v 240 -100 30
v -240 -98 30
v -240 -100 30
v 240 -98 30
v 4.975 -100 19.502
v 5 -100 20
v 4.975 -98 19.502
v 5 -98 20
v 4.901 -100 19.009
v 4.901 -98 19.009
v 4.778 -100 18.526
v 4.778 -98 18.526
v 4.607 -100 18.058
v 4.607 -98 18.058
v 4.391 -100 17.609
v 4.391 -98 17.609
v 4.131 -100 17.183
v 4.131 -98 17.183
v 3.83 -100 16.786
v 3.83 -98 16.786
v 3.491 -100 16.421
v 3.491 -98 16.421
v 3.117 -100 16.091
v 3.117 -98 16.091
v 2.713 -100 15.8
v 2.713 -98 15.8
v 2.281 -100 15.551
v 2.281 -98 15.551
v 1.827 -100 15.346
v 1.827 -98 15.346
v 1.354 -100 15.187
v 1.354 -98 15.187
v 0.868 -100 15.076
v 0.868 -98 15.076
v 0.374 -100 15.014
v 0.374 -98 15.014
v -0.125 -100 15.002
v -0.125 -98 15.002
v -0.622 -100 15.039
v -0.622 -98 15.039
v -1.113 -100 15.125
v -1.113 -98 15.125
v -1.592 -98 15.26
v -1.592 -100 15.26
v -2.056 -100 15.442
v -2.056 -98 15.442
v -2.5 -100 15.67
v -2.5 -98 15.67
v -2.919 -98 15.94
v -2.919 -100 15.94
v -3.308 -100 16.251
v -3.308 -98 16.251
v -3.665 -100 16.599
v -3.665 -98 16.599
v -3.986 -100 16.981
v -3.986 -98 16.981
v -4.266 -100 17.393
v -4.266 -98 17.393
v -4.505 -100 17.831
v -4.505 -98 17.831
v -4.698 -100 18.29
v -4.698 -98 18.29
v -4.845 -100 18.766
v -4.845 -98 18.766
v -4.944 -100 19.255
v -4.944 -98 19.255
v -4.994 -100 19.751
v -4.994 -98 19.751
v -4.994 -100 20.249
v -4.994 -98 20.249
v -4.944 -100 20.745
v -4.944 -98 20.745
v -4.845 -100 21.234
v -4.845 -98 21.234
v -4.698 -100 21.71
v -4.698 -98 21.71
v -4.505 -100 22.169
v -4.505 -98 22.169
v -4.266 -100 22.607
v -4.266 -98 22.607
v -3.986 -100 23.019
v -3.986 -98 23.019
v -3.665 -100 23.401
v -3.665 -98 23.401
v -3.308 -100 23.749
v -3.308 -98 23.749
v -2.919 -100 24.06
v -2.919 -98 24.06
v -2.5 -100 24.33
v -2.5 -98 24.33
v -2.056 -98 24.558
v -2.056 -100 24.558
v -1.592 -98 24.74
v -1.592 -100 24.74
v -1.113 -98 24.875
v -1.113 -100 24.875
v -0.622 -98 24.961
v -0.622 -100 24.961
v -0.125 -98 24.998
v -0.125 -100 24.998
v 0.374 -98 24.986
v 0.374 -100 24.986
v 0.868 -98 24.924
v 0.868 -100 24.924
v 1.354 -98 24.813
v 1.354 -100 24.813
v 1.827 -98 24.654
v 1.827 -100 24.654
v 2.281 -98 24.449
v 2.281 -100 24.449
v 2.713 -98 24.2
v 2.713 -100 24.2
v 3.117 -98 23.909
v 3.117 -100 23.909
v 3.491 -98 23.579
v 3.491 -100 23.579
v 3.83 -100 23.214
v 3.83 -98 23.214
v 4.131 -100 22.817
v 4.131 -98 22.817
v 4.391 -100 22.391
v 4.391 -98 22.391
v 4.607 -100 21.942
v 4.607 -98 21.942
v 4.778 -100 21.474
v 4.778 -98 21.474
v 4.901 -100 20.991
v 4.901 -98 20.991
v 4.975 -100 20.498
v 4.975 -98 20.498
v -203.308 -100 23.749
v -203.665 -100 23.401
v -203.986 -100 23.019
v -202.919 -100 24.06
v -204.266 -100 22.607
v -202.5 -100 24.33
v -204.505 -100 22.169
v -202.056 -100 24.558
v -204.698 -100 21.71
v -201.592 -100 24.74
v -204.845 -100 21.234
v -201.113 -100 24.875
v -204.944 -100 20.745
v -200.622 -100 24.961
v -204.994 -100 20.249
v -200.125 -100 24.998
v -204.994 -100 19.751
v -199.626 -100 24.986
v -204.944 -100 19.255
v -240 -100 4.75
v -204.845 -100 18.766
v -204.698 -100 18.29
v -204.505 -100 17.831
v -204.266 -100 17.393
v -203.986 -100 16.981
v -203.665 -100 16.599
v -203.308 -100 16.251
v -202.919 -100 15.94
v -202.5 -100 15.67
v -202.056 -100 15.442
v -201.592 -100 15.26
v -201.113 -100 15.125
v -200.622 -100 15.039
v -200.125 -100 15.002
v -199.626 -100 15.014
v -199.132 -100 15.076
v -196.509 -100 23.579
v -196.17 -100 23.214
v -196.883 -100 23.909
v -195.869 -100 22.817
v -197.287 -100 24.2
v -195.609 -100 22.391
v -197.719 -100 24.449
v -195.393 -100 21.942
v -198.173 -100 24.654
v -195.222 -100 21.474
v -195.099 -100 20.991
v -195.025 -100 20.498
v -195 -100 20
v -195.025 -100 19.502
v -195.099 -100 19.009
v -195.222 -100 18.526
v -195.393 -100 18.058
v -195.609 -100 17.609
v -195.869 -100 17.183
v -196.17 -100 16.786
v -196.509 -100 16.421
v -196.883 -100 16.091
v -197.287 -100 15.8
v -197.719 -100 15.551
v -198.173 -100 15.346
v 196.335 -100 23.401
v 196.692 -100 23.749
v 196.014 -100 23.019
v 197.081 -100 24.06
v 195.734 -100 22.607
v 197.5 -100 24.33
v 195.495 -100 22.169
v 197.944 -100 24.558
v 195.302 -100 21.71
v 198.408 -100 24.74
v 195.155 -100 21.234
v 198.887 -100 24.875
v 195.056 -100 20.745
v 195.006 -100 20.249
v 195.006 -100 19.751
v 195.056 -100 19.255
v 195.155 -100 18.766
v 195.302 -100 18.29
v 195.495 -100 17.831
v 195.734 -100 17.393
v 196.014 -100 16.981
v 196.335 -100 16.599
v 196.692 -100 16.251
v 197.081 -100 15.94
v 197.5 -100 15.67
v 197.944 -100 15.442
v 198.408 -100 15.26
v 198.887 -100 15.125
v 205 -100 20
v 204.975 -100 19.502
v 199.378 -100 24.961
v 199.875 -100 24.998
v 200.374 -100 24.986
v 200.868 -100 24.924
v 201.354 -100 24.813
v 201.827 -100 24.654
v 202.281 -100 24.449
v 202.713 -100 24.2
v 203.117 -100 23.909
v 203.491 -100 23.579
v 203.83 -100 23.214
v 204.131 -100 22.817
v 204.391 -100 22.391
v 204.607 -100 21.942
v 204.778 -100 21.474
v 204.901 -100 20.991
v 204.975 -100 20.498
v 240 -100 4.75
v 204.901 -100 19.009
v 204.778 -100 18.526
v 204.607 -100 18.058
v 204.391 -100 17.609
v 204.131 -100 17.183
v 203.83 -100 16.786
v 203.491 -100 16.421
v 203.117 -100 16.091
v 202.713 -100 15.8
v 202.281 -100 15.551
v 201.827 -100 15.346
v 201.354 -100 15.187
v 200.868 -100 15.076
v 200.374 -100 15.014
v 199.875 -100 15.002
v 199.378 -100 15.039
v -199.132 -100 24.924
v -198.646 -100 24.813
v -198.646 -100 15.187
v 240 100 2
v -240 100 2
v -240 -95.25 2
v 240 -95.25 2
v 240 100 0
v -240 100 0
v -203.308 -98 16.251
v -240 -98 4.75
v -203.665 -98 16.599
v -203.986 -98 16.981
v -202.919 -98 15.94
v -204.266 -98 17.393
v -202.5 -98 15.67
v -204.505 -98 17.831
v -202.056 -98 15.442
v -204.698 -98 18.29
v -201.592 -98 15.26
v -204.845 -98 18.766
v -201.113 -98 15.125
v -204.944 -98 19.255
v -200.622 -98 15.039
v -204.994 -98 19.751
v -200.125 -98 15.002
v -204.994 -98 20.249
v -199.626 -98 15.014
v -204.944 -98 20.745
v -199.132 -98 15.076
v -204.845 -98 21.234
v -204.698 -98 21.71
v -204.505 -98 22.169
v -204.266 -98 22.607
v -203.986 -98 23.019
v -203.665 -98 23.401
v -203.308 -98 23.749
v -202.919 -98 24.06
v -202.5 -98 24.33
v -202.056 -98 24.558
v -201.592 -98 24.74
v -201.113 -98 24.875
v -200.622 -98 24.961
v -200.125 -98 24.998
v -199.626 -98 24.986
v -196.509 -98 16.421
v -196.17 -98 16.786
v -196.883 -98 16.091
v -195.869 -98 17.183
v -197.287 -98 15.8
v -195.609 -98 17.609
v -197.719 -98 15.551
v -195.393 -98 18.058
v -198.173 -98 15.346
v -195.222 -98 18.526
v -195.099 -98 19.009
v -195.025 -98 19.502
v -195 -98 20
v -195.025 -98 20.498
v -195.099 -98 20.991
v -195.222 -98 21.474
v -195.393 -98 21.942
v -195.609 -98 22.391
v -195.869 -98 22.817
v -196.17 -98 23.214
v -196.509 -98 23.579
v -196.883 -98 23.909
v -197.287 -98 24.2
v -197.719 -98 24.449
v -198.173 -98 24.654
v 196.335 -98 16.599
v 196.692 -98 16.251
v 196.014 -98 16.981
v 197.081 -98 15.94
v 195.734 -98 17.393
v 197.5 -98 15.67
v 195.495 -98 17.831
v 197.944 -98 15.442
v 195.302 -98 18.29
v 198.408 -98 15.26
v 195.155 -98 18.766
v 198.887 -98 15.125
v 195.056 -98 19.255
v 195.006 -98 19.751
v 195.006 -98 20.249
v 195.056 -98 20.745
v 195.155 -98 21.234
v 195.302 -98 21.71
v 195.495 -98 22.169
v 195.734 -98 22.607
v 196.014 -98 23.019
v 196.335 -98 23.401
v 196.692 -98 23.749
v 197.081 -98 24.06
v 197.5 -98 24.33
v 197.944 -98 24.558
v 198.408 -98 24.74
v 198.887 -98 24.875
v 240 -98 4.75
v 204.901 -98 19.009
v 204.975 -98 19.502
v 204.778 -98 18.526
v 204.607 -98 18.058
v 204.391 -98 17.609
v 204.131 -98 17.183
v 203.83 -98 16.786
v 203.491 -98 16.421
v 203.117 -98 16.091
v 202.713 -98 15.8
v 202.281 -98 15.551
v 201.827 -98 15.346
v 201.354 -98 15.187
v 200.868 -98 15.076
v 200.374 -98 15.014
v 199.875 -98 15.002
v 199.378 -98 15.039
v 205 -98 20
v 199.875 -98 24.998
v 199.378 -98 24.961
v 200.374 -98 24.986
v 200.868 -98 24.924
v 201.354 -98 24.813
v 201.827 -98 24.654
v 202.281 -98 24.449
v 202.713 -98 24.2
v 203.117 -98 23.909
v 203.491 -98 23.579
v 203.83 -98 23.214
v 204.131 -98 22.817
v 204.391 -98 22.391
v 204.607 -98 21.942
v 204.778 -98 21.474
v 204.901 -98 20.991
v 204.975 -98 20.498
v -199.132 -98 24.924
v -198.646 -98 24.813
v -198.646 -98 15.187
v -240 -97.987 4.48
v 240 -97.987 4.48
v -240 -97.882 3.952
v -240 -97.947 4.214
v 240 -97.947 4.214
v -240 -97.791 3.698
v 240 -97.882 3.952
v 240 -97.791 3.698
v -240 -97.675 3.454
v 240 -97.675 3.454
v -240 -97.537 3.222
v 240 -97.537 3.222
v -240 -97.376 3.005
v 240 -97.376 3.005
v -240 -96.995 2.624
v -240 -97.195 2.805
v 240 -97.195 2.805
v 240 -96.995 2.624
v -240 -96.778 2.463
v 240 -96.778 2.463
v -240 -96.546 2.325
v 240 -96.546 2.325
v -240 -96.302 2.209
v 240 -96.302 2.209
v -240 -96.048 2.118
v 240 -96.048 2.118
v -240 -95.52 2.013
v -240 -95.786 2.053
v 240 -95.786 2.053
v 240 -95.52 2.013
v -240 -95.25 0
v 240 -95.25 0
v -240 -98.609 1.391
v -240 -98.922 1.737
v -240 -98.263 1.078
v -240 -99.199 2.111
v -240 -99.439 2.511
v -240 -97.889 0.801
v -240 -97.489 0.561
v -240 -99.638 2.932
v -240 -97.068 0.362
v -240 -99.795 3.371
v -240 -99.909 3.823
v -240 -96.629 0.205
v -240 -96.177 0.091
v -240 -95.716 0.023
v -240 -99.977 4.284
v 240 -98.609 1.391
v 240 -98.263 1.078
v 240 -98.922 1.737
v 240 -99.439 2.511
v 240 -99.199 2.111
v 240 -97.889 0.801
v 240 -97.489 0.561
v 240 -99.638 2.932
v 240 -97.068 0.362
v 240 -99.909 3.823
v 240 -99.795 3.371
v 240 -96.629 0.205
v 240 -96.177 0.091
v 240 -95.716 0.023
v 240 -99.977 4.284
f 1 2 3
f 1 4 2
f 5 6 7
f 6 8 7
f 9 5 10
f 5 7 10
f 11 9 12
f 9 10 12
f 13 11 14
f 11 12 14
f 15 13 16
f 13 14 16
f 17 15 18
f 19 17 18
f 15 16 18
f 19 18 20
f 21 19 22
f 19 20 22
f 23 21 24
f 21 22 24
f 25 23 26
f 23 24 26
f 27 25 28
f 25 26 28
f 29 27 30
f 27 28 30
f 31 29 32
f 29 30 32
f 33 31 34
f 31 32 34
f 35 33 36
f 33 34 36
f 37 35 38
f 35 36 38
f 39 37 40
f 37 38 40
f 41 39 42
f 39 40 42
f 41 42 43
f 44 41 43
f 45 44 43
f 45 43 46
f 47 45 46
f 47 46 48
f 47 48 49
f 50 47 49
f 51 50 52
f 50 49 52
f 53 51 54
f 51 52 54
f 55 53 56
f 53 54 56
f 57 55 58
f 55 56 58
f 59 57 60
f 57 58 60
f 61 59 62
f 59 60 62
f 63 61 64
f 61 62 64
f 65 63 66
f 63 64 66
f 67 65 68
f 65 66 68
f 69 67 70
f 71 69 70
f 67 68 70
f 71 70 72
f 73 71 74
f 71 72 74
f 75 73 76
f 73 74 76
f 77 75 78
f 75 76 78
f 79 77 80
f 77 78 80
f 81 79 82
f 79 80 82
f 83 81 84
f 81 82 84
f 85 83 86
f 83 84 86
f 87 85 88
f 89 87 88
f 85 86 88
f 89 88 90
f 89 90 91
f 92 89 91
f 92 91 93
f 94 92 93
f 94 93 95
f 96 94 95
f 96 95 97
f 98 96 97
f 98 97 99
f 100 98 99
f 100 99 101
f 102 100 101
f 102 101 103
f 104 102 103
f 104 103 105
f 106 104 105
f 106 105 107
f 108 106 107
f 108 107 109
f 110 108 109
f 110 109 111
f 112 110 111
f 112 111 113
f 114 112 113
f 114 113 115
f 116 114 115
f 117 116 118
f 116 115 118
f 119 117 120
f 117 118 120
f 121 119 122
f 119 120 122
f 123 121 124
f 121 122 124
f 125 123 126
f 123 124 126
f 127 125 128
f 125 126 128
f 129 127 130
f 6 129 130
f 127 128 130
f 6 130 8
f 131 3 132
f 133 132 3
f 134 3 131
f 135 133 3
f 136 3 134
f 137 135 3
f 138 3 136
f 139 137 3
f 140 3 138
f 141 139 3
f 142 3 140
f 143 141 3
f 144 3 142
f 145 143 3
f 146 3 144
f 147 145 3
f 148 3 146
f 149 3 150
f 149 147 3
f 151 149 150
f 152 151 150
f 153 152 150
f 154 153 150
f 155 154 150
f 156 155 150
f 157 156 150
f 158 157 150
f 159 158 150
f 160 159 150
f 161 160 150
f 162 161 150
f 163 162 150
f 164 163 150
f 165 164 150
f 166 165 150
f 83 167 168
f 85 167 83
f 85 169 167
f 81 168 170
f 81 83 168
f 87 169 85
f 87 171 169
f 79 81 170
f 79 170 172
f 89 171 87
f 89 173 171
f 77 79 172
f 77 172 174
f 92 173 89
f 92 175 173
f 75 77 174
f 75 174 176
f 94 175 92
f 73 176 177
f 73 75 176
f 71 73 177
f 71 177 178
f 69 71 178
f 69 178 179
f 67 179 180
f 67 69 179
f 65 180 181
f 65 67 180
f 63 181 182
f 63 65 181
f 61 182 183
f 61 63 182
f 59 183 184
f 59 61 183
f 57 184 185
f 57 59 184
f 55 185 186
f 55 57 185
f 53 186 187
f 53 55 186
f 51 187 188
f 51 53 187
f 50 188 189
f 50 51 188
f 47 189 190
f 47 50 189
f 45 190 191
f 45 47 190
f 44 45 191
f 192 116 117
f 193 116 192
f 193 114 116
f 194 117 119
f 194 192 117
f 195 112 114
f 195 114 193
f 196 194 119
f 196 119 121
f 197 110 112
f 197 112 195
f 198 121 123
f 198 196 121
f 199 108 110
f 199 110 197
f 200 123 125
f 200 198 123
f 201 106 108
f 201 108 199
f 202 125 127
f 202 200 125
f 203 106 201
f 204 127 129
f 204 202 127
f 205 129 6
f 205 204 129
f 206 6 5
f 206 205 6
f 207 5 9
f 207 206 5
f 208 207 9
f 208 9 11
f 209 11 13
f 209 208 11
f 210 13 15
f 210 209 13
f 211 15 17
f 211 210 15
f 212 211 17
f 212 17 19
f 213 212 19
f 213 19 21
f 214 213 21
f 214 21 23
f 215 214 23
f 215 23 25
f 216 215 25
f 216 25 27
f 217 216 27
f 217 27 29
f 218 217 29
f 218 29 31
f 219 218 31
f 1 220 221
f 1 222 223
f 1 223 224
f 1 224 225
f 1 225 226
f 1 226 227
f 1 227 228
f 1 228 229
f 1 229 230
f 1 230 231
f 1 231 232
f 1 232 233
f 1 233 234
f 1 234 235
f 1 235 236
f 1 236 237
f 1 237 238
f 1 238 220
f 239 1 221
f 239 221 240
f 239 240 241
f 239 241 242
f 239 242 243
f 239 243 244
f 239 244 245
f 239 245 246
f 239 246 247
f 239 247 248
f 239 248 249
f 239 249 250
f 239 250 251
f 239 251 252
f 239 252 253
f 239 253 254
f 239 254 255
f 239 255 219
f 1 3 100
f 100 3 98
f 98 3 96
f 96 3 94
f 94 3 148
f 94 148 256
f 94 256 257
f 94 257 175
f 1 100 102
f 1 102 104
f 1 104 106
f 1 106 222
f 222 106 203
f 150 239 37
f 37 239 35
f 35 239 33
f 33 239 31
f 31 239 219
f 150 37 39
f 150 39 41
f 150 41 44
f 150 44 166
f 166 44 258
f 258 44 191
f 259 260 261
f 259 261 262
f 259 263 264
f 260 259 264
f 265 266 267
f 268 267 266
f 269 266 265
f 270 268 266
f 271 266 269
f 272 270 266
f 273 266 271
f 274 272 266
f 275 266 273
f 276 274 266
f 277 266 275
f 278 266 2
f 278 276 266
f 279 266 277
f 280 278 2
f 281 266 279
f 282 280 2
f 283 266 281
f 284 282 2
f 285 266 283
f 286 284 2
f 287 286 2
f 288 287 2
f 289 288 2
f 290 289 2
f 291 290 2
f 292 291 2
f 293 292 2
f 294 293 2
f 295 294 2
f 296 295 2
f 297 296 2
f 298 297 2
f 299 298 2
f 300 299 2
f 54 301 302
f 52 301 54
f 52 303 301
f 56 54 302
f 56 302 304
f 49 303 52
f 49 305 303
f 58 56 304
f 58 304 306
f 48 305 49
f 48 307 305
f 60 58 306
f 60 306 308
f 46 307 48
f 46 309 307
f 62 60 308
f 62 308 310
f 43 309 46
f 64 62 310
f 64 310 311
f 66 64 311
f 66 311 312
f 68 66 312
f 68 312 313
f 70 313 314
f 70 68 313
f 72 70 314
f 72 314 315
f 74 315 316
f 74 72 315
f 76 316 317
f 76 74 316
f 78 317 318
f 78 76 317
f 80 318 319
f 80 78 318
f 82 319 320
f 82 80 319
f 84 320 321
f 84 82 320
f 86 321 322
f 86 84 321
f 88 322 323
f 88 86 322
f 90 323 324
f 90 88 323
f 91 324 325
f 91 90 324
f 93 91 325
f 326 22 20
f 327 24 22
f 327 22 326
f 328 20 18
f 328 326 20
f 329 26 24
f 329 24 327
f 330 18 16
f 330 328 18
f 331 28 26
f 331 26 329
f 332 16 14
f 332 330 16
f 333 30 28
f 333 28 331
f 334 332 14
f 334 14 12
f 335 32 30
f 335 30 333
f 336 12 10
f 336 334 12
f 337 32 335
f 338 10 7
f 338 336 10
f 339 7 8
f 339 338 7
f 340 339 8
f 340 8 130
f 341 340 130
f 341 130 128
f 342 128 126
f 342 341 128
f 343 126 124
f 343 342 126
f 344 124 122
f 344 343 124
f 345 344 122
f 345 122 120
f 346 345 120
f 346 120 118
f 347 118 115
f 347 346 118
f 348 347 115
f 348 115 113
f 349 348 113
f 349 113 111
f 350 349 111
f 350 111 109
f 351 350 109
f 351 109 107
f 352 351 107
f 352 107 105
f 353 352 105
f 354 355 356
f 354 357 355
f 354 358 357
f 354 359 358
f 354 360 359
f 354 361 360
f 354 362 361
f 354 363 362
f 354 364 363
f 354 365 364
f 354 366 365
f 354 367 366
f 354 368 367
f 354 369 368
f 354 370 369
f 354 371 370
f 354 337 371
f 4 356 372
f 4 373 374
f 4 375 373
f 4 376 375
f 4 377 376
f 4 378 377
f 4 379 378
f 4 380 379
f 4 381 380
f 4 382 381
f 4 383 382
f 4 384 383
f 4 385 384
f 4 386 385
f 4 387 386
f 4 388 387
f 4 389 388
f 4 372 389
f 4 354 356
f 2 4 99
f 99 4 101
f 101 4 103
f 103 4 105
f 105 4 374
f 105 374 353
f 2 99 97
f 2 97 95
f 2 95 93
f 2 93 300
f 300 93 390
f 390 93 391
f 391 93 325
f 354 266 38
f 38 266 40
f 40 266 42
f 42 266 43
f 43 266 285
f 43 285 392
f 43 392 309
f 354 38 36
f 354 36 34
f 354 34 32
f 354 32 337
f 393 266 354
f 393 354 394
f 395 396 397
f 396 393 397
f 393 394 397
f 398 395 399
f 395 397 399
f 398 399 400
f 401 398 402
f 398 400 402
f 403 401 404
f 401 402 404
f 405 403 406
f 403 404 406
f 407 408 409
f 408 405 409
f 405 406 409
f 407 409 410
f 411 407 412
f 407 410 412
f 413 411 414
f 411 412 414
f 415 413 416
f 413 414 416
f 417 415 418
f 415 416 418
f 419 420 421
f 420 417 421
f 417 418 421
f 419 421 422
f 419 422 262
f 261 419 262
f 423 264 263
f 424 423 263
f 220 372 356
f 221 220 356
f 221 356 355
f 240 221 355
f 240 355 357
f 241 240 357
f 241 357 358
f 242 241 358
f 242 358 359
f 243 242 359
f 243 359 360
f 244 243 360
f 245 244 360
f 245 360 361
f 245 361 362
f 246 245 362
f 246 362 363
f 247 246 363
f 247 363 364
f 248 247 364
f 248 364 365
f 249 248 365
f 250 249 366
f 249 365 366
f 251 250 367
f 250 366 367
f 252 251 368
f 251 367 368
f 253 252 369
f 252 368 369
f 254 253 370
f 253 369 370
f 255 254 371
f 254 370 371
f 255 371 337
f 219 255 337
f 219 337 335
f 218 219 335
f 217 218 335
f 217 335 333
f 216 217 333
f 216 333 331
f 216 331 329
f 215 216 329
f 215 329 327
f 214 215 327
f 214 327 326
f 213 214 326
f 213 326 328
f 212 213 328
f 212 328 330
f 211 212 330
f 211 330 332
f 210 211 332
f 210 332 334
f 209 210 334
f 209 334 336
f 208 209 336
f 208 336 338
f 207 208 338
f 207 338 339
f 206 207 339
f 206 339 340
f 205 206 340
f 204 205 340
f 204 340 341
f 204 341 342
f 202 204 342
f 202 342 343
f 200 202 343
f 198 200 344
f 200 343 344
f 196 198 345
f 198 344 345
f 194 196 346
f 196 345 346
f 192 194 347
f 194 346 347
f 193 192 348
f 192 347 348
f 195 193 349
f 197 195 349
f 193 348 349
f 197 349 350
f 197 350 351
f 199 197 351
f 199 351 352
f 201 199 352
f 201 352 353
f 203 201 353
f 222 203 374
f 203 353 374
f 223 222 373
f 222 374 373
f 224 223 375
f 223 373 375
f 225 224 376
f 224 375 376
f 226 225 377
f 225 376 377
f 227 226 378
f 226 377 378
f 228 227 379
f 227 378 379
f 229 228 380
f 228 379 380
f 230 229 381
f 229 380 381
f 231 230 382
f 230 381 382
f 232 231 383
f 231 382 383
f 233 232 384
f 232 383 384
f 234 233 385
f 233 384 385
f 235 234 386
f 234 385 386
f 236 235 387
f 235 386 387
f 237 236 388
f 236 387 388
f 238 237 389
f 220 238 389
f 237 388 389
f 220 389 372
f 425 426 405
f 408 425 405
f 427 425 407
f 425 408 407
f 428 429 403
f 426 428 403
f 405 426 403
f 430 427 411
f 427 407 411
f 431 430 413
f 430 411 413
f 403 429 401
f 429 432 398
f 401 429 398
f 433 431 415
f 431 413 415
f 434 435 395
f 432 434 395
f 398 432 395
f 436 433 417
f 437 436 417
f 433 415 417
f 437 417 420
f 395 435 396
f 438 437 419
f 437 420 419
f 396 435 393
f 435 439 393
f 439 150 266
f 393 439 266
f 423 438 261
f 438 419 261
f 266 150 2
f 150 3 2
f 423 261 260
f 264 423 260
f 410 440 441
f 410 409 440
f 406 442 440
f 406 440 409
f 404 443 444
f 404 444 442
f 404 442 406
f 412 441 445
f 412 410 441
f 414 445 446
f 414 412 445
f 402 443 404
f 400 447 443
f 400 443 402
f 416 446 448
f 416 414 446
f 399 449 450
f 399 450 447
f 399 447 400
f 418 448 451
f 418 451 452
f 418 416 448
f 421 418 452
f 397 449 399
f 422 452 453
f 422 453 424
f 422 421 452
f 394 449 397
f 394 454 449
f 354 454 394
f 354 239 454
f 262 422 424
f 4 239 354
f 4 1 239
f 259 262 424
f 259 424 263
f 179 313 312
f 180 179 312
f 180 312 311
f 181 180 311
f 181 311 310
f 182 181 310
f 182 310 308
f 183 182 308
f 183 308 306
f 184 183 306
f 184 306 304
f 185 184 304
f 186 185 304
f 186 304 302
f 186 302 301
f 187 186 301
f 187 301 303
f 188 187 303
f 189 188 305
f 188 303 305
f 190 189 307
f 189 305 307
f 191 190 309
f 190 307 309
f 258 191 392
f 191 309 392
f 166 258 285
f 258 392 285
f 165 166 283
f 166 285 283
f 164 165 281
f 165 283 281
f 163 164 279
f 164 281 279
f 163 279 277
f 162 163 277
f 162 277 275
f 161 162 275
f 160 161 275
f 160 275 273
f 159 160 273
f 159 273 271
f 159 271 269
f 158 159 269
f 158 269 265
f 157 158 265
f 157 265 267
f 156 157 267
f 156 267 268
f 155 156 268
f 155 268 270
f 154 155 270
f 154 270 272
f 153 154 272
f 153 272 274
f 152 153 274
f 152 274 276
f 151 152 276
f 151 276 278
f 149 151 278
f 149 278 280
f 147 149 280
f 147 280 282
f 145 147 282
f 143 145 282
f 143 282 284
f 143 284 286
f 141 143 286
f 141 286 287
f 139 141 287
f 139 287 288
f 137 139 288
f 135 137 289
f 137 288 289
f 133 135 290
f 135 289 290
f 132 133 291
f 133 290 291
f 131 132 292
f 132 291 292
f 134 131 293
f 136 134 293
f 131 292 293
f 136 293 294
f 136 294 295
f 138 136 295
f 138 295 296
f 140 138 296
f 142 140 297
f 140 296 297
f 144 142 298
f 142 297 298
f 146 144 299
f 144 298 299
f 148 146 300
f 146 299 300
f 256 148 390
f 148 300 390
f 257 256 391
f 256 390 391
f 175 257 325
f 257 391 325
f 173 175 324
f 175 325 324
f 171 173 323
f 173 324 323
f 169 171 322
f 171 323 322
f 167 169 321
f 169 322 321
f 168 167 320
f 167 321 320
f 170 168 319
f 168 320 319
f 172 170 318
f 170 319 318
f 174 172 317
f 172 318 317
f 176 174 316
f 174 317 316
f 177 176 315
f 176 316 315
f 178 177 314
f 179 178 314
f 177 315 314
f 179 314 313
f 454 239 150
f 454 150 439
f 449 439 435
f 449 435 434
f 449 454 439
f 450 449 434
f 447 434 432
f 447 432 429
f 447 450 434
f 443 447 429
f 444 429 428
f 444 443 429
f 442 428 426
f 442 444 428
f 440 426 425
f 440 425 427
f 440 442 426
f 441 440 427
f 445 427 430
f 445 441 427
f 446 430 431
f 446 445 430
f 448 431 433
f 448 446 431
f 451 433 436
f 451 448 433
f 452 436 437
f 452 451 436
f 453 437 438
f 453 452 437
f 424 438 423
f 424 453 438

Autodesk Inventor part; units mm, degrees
ref_plane "YZ Plane" through (0, 0, 0) normal (1, 0, 0) x (0, 1, 0)
ref_plane "XZ Plane" through (0, 0, 0) normal (0, 1, 0) x (-1, 0, 0)
ref_plane "XY Plane" through (0, 0, 0) normal (0, 0, 1) x (1, 0, 0)
sketch "Sketch1" plane through (0, 0, 0) normal (0, 0, 1) x (1, 0, 0)
  line L0 (-240, -100) -> (240, -100)
  line L1 (240, -100) -> (240, 100)
  line L2 (240, 100) -> (-240, 100)
  line L3 (-240, 100) -> (-240, -100)
  line L4 (-240, -100) -> (240, 100) construction
  line L5 (240, -100) -> (-240, 100) construction
  point P0 (0, 0)
  dimension "d0" = 480
  dimension "d1" = 200
extrude "Plate1" add sketch "Sketch1" along normal blind 2
sketch "Sketch2" plane through (0, 0, 0) normal (0, 0, -1) x (-1, 0, 0)
  line L0 (-220, 80) -> (-20, 80) construction
  line L1 (-20, 80) -> (-20, 60) construction
  line L2 (-20, 60) -> (-220, 60) construction
  line L3 (-220, 60) -> (-220, 80) construction
  line L4 (-240, 100) -> (240, 100) projected
  line L5 (-240, -100) -> (-240, 100) projected
  point P0 (0, 0)
  dimension "d6" = 200
  dimension "d9" = 20
  dimension "d10" = 20
  dimension "d11" = 20
mark "Mark1"
sketch "Sketch3" plane through (240, -98, 0) normal (0, -1, 0) x (1, 0, 0)
  line L0 (-480, 0) -> (0, 0)
  line L1 (0, 0) -> (0, 30)
  line L2 (0, 30) -> (-480, 30)
  line L3 (-480, 30) -> (-480, 0)
edge flange "Flange1" height 30 angle 90 thickness 2 bend radius 2.75 thickness toward (0, -1, 0) relief round relief width 2 relief depth 1 edges at (0, -100, 2) wall of the first edge with corners at (-240, -98, 0) (240, -98, 0) (240, -98, 30) (-240, -98, 30)
bend "Bend1"
corner "Corner1"
sketch "Sketch4" plane through (-240, -98, 30) normal (0, 1, 0) x (1, 0, 0)
  line L0 (480, 25.25) -> (0, 25.25) projected
  line L1 (0, 25.25) -> (0, 0) projected
  line L2 (0, 0) -> (480, 0) projected
  line L3 (480, 25.25) -> (480, 0) projected
  circle A0 centre (240, 10) radius 5
  point P0 (240, 30)
  point P1 (240, 25.25)
  point P2 (240, 0)
  dimension "d22" = 10
  dimension "d23" = 10
extrude "Cut1" cut sketch "Sketch4" against normal blind 2 contours A0
pattern_linear "Rectangular Pattern1" count 3 spacing 200 along (1, 0, 0) of "Cut1" first direction both ways yes
equation "\"d24\" = Thickness"
equation "\"d2\" = Thickness"
equation "\"d12\" = BendReliefWidth"
equation "\"d13\" = BendReliefDepth"
equation "\"d14\" = MinimumRemnant"
equation "\"d15\" = TransitionRadius"
equation "\"d18\" = BendRadius"
equation "\"d19\" = CornerReliefSize"
equation "\"d20\" = GapSize"
equation "\"d21\" = JacobiRadiusSize"
equation "\"BendReliefWidth\" = Thickness"
equation "\"BendReliefDepth\" = 0.5 * Thickness"
equation "\"CornerReliefSize\" = 4 * Thickness"
equation "\"MinimumRemnant\" = 2 * Thickness"
equation "\"TransitionRadius\" = BendRadius"
equation "\"JacobiRadiusSize\" = BendRadius"
equation "\"GapSize\" = Thickness"
equation "\"Thickness\" = 2"
equation "\"BendRadius\" = 2.75"
properties part number "TRM 014 face main" material "AISI 304"
